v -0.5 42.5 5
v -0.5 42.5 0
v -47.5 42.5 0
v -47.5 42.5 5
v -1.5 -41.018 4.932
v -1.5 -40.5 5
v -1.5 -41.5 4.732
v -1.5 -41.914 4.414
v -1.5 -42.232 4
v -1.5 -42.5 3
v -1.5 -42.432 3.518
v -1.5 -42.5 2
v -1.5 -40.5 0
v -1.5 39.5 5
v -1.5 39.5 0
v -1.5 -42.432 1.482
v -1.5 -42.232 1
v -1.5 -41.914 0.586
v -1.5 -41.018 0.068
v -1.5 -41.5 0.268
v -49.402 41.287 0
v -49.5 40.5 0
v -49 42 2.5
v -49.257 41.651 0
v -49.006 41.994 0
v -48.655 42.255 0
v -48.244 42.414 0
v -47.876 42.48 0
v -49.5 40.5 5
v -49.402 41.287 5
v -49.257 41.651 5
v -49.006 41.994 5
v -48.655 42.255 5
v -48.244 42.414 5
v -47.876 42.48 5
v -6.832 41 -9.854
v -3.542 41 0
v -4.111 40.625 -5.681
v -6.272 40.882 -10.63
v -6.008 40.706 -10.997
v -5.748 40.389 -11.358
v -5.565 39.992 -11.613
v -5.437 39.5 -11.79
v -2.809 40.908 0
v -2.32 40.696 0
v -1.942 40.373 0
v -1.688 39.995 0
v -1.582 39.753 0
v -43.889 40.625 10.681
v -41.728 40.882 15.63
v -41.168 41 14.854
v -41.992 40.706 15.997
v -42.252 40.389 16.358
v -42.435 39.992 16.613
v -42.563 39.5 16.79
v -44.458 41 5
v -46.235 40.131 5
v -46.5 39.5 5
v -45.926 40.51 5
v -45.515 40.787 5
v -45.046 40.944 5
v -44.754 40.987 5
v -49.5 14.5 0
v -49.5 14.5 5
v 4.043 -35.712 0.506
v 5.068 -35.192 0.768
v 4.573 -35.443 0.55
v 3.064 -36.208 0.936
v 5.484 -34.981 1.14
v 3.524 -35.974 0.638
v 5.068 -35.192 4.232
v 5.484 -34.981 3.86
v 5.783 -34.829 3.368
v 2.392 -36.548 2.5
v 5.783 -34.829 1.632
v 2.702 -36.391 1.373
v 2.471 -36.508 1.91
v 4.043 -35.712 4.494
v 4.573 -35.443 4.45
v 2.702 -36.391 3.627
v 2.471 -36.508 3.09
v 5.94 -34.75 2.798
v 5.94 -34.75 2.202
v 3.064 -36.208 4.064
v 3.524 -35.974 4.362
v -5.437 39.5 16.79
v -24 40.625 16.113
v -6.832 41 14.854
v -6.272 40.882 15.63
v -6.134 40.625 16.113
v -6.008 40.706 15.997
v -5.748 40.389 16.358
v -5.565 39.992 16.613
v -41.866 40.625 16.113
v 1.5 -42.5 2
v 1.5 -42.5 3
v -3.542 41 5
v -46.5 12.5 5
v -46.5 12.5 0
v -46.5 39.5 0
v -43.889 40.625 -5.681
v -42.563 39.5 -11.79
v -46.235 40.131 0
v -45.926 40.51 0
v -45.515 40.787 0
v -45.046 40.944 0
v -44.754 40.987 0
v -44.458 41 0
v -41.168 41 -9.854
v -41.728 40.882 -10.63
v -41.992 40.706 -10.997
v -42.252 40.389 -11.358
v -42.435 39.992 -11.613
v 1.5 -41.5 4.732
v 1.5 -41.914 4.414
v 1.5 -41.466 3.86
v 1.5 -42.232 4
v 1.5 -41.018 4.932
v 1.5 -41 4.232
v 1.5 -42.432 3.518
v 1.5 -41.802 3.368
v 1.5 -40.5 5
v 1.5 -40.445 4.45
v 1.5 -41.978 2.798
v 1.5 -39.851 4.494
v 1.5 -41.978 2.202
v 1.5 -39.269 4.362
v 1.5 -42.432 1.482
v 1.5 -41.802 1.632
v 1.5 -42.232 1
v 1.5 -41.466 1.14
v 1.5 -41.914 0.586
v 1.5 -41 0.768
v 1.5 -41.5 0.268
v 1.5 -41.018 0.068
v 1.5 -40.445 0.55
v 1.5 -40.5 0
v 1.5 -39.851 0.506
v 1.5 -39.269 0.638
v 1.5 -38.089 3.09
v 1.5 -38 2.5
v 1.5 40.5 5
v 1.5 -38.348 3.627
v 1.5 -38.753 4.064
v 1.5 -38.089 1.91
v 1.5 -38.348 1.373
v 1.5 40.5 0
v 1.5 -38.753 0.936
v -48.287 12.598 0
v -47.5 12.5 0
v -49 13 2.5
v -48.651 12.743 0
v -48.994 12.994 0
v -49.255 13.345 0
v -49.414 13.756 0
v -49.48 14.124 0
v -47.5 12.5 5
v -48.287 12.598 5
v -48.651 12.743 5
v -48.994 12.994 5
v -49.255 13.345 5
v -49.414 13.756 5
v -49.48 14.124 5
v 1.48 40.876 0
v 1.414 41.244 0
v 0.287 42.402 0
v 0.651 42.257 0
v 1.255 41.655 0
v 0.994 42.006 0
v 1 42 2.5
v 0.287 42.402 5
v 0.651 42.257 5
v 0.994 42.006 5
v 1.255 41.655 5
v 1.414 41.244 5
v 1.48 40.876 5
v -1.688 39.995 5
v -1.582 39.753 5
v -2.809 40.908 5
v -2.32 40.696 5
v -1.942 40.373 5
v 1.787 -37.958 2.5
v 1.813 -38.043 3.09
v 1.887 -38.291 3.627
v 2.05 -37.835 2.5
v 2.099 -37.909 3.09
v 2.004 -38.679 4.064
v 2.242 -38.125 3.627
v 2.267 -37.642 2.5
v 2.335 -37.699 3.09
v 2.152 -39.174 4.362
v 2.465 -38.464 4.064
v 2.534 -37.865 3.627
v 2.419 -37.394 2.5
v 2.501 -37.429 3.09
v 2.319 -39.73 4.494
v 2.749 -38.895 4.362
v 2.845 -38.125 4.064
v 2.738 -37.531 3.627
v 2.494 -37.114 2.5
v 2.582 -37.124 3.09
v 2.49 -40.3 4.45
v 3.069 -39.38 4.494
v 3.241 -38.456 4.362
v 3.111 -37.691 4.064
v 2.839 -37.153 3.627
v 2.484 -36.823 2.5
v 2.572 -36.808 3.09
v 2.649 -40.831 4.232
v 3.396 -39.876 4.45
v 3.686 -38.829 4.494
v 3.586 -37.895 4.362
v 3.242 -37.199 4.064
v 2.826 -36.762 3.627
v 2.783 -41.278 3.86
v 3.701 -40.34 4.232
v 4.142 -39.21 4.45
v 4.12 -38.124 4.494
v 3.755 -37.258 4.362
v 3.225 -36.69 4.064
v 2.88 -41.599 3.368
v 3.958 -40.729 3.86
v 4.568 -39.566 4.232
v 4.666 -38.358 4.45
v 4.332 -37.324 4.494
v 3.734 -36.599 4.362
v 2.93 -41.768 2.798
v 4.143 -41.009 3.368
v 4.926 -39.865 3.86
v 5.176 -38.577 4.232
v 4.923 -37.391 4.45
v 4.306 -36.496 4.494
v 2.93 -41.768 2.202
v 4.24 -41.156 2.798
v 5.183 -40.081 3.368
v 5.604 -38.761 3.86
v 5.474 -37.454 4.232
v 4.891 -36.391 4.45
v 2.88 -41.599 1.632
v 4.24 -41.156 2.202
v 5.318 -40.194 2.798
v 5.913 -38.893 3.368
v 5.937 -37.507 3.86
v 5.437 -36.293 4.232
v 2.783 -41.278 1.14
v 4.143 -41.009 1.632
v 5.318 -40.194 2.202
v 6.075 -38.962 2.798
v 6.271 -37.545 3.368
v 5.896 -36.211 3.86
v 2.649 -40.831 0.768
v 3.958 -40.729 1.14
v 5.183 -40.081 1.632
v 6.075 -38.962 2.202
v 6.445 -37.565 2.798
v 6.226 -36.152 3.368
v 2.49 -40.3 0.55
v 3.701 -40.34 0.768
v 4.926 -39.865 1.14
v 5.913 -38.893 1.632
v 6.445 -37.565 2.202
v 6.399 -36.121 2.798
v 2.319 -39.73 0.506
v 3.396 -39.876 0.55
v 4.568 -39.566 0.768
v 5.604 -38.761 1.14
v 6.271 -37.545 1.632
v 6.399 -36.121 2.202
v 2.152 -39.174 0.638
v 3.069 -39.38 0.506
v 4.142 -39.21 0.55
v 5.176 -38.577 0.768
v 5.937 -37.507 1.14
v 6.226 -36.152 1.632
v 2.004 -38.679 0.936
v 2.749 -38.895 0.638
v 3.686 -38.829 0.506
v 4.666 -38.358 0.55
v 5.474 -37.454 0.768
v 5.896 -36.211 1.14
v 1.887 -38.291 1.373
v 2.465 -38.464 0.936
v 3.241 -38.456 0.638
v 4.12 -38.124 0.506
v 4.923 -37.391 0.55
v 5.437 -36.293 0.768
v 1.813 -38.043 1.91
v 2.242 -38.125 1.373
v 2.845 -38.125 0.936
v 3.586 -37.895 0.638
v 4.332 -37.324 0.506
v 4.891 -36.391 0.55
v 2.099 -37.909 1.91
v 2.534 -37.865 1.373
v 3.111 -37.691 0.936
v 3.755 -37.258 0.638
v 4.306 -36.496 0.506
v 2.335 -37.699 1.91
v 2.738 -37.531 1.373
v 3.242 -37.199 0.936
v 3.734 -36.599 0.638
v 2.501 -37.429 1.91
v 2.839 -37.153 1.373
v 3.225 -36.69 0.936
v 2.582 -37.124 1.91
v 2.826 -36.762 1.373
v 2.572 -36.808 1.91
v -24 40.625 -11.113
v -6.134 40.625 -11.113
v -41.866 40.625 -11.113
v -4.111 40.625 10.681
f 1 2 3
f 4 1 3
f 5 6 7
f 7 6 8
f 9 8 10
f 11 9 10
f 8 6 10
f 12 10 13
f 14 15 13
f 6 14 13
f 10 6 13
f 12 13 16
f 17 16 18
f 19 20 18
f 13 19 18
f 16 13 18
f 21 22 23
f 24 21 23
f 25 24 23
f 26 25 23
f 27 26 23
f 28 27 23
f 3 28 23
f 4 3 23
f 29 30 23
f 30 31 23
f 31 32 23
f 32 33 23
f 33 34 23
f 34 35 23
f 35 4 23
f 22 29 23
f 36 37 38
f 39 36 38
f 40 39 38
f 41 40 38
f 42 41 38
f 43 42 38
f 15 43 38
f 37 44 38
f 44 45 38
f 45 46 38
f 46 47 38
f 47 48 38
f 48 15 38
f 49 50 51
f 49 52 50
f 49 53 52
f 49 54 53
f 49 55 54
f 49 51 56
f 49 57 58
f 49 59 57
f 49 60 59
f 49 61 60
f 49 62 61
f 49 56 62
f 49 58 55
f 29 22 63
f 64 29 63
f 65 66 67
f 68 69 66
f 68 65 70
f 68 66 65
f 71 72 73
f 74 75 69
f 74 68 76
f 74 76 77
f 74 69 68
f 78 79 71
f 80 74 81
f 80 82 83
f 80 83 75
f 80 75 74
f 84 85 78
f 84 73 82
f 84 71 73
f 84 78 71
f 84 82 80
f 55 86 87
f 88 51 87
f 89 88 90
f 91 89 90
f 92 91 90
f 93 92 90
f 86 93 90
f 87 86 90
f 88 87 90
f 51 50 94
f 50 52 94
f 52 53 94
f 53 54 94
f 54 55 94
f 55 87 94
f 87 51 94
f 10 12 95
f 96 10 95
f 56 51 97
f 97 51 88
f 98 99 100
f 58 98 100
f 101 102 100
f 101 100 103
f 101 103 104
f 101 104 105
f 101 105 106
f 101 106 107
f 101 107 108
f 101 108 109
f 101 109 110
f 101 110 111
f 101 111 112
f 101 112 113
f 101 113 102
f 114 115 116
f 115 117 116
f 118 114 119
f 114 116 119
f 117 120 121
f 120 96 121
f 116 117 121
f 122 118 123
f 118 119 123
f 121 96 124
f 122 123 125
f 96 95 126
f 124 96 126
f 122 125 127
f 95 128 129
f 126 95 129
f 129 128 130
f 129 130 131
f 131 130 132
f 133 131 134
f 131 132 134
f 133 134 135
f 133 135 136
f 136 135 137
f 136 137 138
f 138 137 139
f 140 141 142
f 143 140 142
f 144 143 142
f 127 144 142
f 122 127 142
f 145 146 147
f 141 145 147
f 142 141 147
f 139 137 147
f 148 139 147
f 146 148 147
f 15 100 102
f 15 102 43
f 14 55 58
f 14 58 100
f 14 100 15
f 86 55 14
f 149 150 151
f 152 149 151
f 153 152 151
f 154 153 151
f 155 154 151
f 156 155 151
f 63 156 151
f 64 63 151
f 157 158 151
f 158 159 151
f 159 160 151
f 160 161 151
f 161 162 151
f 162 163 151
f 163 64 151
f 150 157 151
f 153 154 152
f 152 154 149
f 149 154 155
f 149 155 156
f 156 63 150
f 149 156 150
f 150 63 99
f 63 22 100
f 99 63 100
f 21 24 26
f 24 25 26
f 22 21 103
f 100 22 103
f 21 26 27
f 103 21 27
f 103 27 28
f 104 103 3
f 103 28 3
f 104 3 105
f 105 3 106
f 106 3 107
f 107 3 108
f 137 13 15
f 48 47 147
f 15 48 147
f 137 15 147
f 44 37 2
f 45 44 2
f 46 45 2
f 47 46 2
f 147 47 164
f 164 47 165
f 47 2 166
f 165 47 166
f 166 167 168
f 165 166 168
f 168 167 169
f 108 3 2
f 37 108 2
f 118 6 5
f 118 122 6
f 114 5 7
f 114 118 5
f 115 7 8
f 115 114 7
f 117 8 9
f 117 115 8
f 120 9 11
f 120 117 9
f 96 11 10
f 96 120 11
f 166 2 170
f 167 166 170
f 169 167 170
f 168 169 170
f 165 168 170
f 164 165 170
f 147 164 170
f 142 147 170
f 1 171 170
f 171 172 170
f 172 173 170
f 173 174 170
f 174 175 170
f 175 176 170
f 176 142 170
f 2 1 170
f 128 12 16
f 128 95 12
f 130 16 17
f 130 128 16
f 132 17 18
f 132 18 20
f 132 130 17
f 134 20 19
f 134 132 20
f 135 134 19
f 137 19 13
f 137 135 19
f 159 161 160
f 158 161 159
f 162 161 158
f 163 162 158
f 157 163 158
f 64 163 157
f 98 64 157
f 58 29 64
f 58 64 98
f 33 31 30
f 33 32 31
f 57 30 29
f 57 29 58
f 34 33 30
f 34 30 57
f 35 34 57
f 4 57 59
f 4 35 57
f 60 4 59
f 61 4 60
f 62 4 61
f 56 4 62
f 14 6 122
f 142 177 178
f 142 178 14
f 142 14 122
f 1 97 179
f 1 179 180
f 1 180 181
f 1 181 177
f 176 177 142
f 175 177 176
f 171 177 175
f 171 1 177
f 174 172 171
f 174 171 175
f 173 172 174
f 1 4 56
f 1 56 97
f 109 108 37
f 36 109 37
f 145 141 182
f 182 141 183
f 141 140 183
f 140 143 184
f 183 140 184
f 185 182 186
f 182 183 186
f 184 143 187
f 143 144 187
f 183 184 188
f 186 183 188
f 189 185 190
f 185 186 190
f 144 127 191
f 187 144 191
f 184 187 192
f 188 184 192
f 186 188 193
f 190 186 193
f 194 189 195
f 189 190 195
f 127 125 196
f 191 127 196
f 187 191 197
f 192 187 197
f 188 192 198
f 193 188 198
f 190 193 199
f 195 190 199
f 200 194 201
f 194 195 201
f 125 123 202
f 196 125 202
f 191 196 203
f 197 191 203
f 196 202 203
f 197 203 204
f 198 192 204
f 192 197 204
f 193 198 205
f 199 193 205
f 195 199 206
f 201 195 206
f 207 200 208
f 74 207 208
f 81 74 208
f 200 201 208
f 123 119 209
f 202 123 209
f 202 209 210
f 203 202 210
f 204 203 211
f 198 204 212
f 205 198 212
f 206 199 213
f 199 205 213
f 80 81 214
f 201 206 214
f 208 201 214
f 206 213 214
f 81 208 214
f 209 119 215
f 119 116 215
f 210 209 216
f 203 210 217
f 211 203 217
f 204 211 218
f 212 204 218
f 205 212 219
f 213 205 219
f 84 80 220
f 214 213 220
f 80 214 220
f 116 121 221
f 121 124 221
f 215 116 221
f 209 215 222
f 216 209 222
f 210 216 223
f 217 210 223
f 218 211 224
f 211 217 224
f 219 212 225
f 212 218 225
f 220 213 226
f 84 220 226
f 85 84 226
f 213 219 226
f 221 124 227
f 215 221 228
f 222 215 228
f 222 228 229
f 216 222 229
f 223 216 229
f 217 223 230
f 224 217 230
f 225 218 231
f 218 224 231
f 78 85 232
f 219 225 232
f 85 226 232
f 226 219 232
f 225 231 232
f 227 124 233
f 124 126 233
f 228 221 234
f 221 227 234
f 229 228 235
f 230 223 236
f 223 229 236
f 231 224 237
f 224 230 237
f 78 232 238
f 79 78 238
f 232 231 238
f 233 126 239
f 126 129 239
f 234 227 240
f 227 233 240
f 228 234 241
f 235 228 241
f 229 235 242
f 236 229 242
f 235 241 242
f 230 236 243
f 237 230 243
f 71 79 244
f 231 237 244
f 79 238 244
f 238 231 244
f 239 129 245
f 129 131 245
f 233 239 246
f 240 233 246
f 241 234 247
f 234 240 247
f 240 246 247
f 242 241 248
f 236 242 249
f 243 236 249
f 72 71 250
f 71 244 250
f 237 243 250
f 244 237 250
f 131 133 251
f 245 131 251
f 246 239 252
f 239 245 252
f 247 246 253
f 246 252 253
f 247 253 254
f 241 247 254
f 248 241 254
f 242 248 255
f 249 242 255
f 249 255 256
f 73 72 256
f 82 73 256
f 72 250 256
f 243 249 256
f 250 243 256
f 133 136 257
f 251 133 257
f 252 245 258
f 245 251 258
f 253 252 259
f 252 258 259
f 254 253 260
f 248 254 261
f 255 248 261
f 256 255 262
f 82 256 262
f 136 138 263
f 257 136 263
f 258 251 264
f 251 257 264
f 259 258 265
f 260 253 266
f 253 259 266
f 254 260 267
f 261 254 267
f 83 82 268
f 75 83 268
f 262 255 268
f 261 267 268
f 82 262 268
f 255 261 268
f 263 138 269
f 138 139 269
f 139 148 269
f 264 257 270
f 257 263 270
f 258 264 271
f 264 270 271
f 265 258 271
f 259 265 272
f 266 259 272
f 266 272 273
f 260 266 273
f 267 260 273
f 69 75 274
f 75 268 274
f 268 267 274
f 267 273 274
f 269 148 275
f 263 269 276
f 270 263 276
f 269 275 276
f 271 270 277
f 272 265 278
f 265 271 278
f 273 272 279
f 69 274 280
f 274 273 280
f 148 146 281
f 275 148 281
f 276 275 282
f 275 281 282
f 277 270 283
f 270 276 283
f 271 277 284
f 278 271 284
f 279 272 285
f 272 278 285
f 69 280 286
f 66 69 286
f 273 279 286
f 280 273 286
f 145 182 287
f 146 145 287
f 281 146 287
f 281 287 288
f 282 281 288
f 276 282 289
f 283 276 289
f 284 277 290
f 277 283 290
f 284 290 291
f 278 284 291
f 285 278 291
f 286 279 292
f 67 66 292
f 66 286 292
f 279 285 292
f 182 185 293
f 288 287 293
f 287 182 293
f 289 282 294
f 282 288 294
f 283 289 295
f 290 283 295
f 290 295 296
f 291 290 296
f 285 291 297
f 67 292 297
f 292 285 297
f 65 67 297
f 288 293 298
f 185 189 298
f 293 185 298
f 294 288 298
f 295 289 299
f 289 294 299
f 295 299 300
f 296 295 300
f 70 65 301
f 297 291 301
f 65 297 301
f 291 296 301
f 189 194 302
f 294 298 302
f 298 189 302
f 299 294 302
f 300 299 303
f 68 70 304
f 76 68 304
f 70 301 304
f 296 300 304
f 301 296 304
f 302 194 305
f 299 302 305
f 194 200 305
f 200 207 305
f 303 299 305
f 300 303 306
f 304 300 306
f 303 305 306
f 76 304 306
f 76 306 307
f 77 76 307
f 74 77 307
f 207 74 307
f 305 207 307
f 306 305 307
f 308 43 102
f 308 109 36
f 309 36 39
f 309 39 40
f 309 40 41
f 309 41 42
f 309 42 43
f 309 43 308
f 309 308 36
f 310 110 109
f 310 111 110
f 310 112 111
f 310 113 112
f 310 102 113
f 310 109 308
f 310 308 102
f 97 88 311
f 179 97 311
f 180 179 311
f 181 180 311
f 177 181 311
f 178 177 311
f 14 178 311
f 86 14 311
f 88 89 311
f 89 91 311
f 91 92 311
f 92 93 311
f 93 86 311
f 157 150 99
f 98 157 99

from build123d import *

# Parameters (mm, degrees)
F0_W         = 3
F0_H         = 27
F1_DEPTH     = 5
F3_DEPTH     = 1.5
F4_R         = 2
F5_ANGLE     = 116.8724050768
F6_R         = 2
F7_T1_DEPTH  = 15
F7_T3_DEPTH  = 46.8093211895
F7_T8_DEPTH  = 22.1126839652
F7_T13_DEPTH = 22.1126839652
F7_T18_DEPTH = 22.1126839652
F7_T23_DEPTH = 22.1126839652
F7_T28_DEPTH = 22.1126839652
F7_T33_DEPTH = 22.1126839652
F7_T38_DEPTH = 22.1126839652
F7_T43_DEPTH = 22.1126839652


# Not quite as in the source:
# - a fillet or chamfer that OpenCascade refuses, or shapes differently, is made with other operations: its cross-section is extruded or revolved along the edge and cut away or added


with BuildPart() as f1:
    # F0 (on Top) → F1 (new body)
    with BuildSketch(Plane.XY):
        Polygon((1.5, -42.5), (1.5, 42.5), (-1.5, 42.5), (-1.5, 39.5), (-1.5, -42.5), align=None)
        Polygon((-1.5, 39.5), (-1.5, 42.5), (-49.5, 42.5), (-49.5, 39.5), (-46.5, 39.5), align=None)
        with Locations((-48, 26)):
            Rectangle(F0_W, F0_H)
    extrude(amount=F1_DEPTH)

    # F2 (on face) → F3 (join)
    with BuildSketch(Plane.XZ.offset(-39.5)):
        Polygon((-42.563431412, 16.7904171348), (-46.5, 5), (-1.5, 5), (-5.436568588, 16.7904171348), (-24, 16.7904171348), align=None)
        Polygon((-1.5, 0), (-46.5, 0), (-42.563431412, -11.7904171348), (-24, -11.7904171348), (-5.436568588, -11.7904171348), align=None)
    extrude(amount=-F3_DEPTH)

    # F4 (on face) → F5 (revolve)
    with BuildSketch(Plane.YZ.offset(1.5)):
        with Locations((-40, 2.5)):
            Circle(F4_R)
    revolve(axis=Axis((1.5, -37, 2.371235867), (0, 0, 1)), revolution_arc=F5_ANGLE)

    # F6
    f6_edges = [f1.edges().sort_by_distance(p)[0] for p in [
        (0, -42.5, 0),
        (0, -42.5, 5),
    ]]
    fillet(f6_edges, radius=F6_R)

    # F7: fillet of radius 2 on 9 edges, made by hand

    # F7_s2 → F7_t1 (cut)
    with BuildSketch(Plane.XY.offset(-5)):
        with BuildLine():
            add(Edge.make_bspline(
                [(1.5, 40.5), (1.5, 42.5), (-0.5, 42.5)],
                knots=[0, 0, 0, 1, 1, 1], degree=2, weights=[1, 1, 1]))
            Line((-0.5, 42.5), (1.5, 42.5))
            Line((1.5, 42.5), (1.5, 40.5))
        make_face()
        with BuildLine():
            add(Edge.make_bspline(
                [(-47.5, 42.5), (-49.5, 42.5), (-49.5, 40.5)],
                knots=[0, 0, 0, 1, 1, 1], degree=2, weights=[1, 1, 1]))
            Line((-49.5, 40.5), (-49.5, 42.5))
            Line((-49.5, 42.5), (-47.5, 42.5))
        make_face()
        with BuildLine():
            add(Edge.make_bspline(
                [(-49.5, 14.5), (-49.5, 12.5), (-47.5, 12.5)],
                knots=[0, 0, 0, 1, 1, 1], degree=2, weights=[1, 1, 1]))
            Line((-47.5, 12.5), (-49.5, 12.5))
            Line((-49.5, 12.5), (-49.5, 14.5))
        make_face()
    extrude(amount=F7_T1_DEPTH, mode=Mode.SUBTRACT)

    # F7_s4 → F7_t3 (cut)
    with BuildSketch(Plane.YZ.offset(-47.4046605947)):
        with BuildLine():
            add(Edge.make_bspline(
                [(41, 14.8539254617), (41, 16.4031188001), (39.5, 16.7904171348)],
                knots=[0, 0, 0, 1, 1, 1], degree=2, weights=[1, 1, 1]))
            Line((39.5, 16.7904171348), (41, 16.7904171348))
            Line((41, 16.7904171348), (41, 14.8539254617))
        make_face()
        with BuildLine():
            add(Edge.make_bspline(
                [(41, -9.8539254617), (41, -11.4031188001), (39.5, -11.7904171348)],
                knots=[0, 0, 0, 1, 1, 1], degree=2, weights=[1, 1, 1]))
            Line((39.5, -11.7904171348), (41, -11.7904171348))
            Line((41, -11.7904171348), (41, -9.8539254617))
        make_face()
    extrude(amount=F7_T3_DEPTH, mode=Mode.SUBTRACT)


with BuildPart() as f7_tool6:
    # F7_s7 → F7_t8 (new body)
    with BuildSketch(Plane(origin=(2.3080156307, 0, 6.912737942), x_dir=(0, 1, 0), z_dir=(-0.3166932536, 0, -0.9485280086))):
        with BuildLine():
            add(Edge.make_bspline(
                [(41, -43.7535269955), (41, -45.302720334), (39.5, -45.6900186686)],
                knots=[0, 0, 0, 1, 1, 1], degree=2, weights=[1, 1, 1]))
            Line((39.5, -45.6900186686), (41, -45.6900186686))
            Line((41, -45.6900186686), (41, -43.7535269955))
        make_face()
    extrude(amount=F7_T8_DEPTH)

    split(bisect_by=Plane.XY.offset(5), keep=Keep.TOP)


with BuildPart() as f1_1:
    add(f1.part)

    # F7_t5: cut F7_tool6
    add(f7_tool6.part, mode=Mode.SUBTRACT)


with BuildPart() as f7_tool11:
    # F7_s12 → F7_t13 (new body)
    with BuildSketch(Plane(origin=(2.3080156307, 0, 6.912737942), x_dir=(0, 1, 0), z_dir=(-0.3166932536, 0, -0.9485280086))):
        with BuildLine():
            add(Edge.make_bspline(
                [(41, -43.7535269955), (41, -45.302720334), (39.5, -45.6900186686)],
                knots=[0, 0, 0, 1, 1, 1], degree=2, weights=[1, 1, 1]))
            Line((39.5, -45.6900186686), (41, -45.6900186686))
            Line((41, -45.6900186686), (41, -43.7535269955))
        make_face()
    extrude(amount=F7_T13_DEPTH)

    split(bisect_by=Plane.XY, keep=Keep.BOTTOM)


with BuildPart() as f1_2:
    add(f1_1.part)

    # F7_t10: cut F7_tool11
    add(f7_tool11.part, mode=Mode.SUBTRACT)


with BuildPart() as f7_tool16:
    # F7_s17 → F7_t18 (new body)
    with BuildSketch(Plane(origin=(-0.1192194099, 0, 0.3570740714), x_dir=(0, 1, 0), z_dir=(-0.3166932536, 0, 0.9485280086))):
        with BuildLine():
            add(Edge.make_bspline(
                [(39.5, -0.160674255), (41, 0.2266240796), (41, 1.7758174181)],
                knots=[0, 0, 0, 1, 1, 1], degree=2, weights=[1, 1, 1]))
            Line((41, 1.7758174181), (41, -0.160674255))
            Line((41, -0.160674255), (39.5, -0.160674255))
        make_face()
    extrude(amount=F7_T18_DEPTH)

    split(bisect_by=Plane.XY, keep=Keep.BOTTOM)


with BuildPart() as f1_3:
    add(f1_2.part)

    # F7_t15: cut F7_tool16
    add(f7_tool16.part, mode=Mode.SUBTRACT)


with BuildPart() as f7_tool21:
    # F7_s22 → F7_t23 (new body)
    with BuildSketch(Plane(origin=(-0.1192194099, 0, 0.3570740714), x_dir=(0, 1, 0), z_dir=(-0.3166932536, 0, 0.9485280086))):
        with BuildLine():
            add(Edge.make_bspline(
                [(39.5, -0.160674255), (41, 0.2266240796), (41, 1.7758174181)],
                knots=[0, 0, 0, 1, 1, 1], degree=2, weights=[1, 1, 1]))
            Line((41, 1.7758174181), (41, -0.160674255))
            Line((41, -0.160674255), (39.5, -0.160674255))
        make_face()
    extrude(amount=F7_T23_DEPTH)

    split(bisect_by=Plane.XY.offset(5), keep=Keep.TOP)


with BuildPart() as f1_4:
    add(f1_3.part)

    # F7_t20: cut F7_tool21
    add(f7_tool21.part, mode=Mode.SUBTRACT)


with BuildPart() as f7_tool26:
    # F7_s27 → F7_t28 (new body)
    with BuildSketch(Plane(origin=(-6.1968843057, 0, 18.5602890603), x_dir=(0, 1, 0), z_dir=(0.3166932536, 0, -0.9485280086))):
        with BuildLine():
            add(Edge.make_bspline(
                [(41, -42.1700607276), (41, -43.7192540661), (39.5, -44.1065524007)],
                knots=[0, 0, 0, 1, 1, 1], degree=2, weights=[1, 1, 1]))
            Line((39.5, -44.1065524007), (41, -44.1065524007))
            Line((41, -44.1065524007), (41, -42.1700607276))
        make_face()
    extrude(amount=F7_T28_DEPTH)

    split(bisect_by=Plane.XY.offset(5), keep=Keep.TOP)


with BuildPart() as f1_5:
    add(f1_4.part)

    # F7_t25: cut F7_tool26
    add(f7_tool26.part, mode=Mode.SUBTRACT)


with BuildPart() as f7_tool31:
    # F7_s32 → F7_t33 (new body)
    with BuildSketch(Plane(origin=(-6.1968843057, 0, 18.5602890603), x_dir=(0, 1, 0), z_dir=(0.3166932536, 0, -0.9485280086))):
        with BuildLine():
            add(Edge.make_bspline(
                [(41, -42.1700607276), (41, -43.7192540661), (39.5, -44.1065524007)],
                knots=[0, 0, 0, 1, 1, 1], degree=2, weights=[1, 1, 1]))
            Line((39.5, -44.1065524007), (41, -44.1065524007))
            Line((41, -44.1065524007), (41, -42.1700607276))
        make_face()
    extrude(amount=F7_T33_DEPTH)

    split(bisect_by=Plane.XY, keep=Keep.BOTTOM)


with BuildPart() as f1_6:
    add(f1_5.part)

    # F7_t30: cut F7_tool31
    add(f7_tool31.part, mode=Mode.SUBTRACT)


with BuildPart() as f7_tool36:
    # F7_s37 → F7_t38 (new body)
    with BuildSketch(Plane(origin=(-5.6201951346, 0, -16.8330472425), x_dir=(0, 1, 0), z_dir=(0.3166932536, 0, 0.9485280086))):
        with BuildLine():
            add(Edge.make_bspline(
                [(39.5, 1.4227920129), (41, 1.8100903475), (41, 3.359283686)],
                knots=[0, 0, 0, 1, 1, 1], degree=2, weights=[1, 1, 1]))
            Line((41, 3.359283686), (41, 1.4227920129))
            Line((41, 1.4227920129), (39.5, 1.4227920129))
        make_face()
    extrude(amount=F7_T38_DEPTH)

    split(bisect_by=Plane.XY, keep=Keep.BOTTOM)


with BuildPart() as f1_7:
    add(f1_6.part)

    # F7_t35: cut F7_tool36
    add(f7_tool36.part, mode=Mode.SUBTRACT)


with BuildPart() as f7_tool41:
    # F7_s42 → F7_t43 (new body)
    with BuildSketch(Plane(origin=(-5.6201951346, 0, -16.8330472425), x_dir=(0, 1, 0), z_dir=(0.3166932536, 0, 0.9485280086))):
        with BuildLine():
            add(Edge.make_bspline(
                [(39.5, 1.4227920129), (41, 1.8100903475), (41, 3.359283686)],
                knots=[0, 0, 0, 1, 1, 1], degree=2, weights=[1, 1, 1]))
            Line((41, 3.359283686), (41, 1.4227920129))
            Line((41, 1.4227920129), (39.5, 1.4227920129))
        make_face()
    extrude(amount=F7_T43_DEPTH)

    split(bisect_by=Plane.XY.offset(5), keep=Keep.TOP)


with BuildPart() as f1_8:
    add(f1_7.part)

    # F7_t40: cut F7_tool41
    add(f7_tool41.part, mode=Mode.SUBTRACT)


solid = f1_8.part
